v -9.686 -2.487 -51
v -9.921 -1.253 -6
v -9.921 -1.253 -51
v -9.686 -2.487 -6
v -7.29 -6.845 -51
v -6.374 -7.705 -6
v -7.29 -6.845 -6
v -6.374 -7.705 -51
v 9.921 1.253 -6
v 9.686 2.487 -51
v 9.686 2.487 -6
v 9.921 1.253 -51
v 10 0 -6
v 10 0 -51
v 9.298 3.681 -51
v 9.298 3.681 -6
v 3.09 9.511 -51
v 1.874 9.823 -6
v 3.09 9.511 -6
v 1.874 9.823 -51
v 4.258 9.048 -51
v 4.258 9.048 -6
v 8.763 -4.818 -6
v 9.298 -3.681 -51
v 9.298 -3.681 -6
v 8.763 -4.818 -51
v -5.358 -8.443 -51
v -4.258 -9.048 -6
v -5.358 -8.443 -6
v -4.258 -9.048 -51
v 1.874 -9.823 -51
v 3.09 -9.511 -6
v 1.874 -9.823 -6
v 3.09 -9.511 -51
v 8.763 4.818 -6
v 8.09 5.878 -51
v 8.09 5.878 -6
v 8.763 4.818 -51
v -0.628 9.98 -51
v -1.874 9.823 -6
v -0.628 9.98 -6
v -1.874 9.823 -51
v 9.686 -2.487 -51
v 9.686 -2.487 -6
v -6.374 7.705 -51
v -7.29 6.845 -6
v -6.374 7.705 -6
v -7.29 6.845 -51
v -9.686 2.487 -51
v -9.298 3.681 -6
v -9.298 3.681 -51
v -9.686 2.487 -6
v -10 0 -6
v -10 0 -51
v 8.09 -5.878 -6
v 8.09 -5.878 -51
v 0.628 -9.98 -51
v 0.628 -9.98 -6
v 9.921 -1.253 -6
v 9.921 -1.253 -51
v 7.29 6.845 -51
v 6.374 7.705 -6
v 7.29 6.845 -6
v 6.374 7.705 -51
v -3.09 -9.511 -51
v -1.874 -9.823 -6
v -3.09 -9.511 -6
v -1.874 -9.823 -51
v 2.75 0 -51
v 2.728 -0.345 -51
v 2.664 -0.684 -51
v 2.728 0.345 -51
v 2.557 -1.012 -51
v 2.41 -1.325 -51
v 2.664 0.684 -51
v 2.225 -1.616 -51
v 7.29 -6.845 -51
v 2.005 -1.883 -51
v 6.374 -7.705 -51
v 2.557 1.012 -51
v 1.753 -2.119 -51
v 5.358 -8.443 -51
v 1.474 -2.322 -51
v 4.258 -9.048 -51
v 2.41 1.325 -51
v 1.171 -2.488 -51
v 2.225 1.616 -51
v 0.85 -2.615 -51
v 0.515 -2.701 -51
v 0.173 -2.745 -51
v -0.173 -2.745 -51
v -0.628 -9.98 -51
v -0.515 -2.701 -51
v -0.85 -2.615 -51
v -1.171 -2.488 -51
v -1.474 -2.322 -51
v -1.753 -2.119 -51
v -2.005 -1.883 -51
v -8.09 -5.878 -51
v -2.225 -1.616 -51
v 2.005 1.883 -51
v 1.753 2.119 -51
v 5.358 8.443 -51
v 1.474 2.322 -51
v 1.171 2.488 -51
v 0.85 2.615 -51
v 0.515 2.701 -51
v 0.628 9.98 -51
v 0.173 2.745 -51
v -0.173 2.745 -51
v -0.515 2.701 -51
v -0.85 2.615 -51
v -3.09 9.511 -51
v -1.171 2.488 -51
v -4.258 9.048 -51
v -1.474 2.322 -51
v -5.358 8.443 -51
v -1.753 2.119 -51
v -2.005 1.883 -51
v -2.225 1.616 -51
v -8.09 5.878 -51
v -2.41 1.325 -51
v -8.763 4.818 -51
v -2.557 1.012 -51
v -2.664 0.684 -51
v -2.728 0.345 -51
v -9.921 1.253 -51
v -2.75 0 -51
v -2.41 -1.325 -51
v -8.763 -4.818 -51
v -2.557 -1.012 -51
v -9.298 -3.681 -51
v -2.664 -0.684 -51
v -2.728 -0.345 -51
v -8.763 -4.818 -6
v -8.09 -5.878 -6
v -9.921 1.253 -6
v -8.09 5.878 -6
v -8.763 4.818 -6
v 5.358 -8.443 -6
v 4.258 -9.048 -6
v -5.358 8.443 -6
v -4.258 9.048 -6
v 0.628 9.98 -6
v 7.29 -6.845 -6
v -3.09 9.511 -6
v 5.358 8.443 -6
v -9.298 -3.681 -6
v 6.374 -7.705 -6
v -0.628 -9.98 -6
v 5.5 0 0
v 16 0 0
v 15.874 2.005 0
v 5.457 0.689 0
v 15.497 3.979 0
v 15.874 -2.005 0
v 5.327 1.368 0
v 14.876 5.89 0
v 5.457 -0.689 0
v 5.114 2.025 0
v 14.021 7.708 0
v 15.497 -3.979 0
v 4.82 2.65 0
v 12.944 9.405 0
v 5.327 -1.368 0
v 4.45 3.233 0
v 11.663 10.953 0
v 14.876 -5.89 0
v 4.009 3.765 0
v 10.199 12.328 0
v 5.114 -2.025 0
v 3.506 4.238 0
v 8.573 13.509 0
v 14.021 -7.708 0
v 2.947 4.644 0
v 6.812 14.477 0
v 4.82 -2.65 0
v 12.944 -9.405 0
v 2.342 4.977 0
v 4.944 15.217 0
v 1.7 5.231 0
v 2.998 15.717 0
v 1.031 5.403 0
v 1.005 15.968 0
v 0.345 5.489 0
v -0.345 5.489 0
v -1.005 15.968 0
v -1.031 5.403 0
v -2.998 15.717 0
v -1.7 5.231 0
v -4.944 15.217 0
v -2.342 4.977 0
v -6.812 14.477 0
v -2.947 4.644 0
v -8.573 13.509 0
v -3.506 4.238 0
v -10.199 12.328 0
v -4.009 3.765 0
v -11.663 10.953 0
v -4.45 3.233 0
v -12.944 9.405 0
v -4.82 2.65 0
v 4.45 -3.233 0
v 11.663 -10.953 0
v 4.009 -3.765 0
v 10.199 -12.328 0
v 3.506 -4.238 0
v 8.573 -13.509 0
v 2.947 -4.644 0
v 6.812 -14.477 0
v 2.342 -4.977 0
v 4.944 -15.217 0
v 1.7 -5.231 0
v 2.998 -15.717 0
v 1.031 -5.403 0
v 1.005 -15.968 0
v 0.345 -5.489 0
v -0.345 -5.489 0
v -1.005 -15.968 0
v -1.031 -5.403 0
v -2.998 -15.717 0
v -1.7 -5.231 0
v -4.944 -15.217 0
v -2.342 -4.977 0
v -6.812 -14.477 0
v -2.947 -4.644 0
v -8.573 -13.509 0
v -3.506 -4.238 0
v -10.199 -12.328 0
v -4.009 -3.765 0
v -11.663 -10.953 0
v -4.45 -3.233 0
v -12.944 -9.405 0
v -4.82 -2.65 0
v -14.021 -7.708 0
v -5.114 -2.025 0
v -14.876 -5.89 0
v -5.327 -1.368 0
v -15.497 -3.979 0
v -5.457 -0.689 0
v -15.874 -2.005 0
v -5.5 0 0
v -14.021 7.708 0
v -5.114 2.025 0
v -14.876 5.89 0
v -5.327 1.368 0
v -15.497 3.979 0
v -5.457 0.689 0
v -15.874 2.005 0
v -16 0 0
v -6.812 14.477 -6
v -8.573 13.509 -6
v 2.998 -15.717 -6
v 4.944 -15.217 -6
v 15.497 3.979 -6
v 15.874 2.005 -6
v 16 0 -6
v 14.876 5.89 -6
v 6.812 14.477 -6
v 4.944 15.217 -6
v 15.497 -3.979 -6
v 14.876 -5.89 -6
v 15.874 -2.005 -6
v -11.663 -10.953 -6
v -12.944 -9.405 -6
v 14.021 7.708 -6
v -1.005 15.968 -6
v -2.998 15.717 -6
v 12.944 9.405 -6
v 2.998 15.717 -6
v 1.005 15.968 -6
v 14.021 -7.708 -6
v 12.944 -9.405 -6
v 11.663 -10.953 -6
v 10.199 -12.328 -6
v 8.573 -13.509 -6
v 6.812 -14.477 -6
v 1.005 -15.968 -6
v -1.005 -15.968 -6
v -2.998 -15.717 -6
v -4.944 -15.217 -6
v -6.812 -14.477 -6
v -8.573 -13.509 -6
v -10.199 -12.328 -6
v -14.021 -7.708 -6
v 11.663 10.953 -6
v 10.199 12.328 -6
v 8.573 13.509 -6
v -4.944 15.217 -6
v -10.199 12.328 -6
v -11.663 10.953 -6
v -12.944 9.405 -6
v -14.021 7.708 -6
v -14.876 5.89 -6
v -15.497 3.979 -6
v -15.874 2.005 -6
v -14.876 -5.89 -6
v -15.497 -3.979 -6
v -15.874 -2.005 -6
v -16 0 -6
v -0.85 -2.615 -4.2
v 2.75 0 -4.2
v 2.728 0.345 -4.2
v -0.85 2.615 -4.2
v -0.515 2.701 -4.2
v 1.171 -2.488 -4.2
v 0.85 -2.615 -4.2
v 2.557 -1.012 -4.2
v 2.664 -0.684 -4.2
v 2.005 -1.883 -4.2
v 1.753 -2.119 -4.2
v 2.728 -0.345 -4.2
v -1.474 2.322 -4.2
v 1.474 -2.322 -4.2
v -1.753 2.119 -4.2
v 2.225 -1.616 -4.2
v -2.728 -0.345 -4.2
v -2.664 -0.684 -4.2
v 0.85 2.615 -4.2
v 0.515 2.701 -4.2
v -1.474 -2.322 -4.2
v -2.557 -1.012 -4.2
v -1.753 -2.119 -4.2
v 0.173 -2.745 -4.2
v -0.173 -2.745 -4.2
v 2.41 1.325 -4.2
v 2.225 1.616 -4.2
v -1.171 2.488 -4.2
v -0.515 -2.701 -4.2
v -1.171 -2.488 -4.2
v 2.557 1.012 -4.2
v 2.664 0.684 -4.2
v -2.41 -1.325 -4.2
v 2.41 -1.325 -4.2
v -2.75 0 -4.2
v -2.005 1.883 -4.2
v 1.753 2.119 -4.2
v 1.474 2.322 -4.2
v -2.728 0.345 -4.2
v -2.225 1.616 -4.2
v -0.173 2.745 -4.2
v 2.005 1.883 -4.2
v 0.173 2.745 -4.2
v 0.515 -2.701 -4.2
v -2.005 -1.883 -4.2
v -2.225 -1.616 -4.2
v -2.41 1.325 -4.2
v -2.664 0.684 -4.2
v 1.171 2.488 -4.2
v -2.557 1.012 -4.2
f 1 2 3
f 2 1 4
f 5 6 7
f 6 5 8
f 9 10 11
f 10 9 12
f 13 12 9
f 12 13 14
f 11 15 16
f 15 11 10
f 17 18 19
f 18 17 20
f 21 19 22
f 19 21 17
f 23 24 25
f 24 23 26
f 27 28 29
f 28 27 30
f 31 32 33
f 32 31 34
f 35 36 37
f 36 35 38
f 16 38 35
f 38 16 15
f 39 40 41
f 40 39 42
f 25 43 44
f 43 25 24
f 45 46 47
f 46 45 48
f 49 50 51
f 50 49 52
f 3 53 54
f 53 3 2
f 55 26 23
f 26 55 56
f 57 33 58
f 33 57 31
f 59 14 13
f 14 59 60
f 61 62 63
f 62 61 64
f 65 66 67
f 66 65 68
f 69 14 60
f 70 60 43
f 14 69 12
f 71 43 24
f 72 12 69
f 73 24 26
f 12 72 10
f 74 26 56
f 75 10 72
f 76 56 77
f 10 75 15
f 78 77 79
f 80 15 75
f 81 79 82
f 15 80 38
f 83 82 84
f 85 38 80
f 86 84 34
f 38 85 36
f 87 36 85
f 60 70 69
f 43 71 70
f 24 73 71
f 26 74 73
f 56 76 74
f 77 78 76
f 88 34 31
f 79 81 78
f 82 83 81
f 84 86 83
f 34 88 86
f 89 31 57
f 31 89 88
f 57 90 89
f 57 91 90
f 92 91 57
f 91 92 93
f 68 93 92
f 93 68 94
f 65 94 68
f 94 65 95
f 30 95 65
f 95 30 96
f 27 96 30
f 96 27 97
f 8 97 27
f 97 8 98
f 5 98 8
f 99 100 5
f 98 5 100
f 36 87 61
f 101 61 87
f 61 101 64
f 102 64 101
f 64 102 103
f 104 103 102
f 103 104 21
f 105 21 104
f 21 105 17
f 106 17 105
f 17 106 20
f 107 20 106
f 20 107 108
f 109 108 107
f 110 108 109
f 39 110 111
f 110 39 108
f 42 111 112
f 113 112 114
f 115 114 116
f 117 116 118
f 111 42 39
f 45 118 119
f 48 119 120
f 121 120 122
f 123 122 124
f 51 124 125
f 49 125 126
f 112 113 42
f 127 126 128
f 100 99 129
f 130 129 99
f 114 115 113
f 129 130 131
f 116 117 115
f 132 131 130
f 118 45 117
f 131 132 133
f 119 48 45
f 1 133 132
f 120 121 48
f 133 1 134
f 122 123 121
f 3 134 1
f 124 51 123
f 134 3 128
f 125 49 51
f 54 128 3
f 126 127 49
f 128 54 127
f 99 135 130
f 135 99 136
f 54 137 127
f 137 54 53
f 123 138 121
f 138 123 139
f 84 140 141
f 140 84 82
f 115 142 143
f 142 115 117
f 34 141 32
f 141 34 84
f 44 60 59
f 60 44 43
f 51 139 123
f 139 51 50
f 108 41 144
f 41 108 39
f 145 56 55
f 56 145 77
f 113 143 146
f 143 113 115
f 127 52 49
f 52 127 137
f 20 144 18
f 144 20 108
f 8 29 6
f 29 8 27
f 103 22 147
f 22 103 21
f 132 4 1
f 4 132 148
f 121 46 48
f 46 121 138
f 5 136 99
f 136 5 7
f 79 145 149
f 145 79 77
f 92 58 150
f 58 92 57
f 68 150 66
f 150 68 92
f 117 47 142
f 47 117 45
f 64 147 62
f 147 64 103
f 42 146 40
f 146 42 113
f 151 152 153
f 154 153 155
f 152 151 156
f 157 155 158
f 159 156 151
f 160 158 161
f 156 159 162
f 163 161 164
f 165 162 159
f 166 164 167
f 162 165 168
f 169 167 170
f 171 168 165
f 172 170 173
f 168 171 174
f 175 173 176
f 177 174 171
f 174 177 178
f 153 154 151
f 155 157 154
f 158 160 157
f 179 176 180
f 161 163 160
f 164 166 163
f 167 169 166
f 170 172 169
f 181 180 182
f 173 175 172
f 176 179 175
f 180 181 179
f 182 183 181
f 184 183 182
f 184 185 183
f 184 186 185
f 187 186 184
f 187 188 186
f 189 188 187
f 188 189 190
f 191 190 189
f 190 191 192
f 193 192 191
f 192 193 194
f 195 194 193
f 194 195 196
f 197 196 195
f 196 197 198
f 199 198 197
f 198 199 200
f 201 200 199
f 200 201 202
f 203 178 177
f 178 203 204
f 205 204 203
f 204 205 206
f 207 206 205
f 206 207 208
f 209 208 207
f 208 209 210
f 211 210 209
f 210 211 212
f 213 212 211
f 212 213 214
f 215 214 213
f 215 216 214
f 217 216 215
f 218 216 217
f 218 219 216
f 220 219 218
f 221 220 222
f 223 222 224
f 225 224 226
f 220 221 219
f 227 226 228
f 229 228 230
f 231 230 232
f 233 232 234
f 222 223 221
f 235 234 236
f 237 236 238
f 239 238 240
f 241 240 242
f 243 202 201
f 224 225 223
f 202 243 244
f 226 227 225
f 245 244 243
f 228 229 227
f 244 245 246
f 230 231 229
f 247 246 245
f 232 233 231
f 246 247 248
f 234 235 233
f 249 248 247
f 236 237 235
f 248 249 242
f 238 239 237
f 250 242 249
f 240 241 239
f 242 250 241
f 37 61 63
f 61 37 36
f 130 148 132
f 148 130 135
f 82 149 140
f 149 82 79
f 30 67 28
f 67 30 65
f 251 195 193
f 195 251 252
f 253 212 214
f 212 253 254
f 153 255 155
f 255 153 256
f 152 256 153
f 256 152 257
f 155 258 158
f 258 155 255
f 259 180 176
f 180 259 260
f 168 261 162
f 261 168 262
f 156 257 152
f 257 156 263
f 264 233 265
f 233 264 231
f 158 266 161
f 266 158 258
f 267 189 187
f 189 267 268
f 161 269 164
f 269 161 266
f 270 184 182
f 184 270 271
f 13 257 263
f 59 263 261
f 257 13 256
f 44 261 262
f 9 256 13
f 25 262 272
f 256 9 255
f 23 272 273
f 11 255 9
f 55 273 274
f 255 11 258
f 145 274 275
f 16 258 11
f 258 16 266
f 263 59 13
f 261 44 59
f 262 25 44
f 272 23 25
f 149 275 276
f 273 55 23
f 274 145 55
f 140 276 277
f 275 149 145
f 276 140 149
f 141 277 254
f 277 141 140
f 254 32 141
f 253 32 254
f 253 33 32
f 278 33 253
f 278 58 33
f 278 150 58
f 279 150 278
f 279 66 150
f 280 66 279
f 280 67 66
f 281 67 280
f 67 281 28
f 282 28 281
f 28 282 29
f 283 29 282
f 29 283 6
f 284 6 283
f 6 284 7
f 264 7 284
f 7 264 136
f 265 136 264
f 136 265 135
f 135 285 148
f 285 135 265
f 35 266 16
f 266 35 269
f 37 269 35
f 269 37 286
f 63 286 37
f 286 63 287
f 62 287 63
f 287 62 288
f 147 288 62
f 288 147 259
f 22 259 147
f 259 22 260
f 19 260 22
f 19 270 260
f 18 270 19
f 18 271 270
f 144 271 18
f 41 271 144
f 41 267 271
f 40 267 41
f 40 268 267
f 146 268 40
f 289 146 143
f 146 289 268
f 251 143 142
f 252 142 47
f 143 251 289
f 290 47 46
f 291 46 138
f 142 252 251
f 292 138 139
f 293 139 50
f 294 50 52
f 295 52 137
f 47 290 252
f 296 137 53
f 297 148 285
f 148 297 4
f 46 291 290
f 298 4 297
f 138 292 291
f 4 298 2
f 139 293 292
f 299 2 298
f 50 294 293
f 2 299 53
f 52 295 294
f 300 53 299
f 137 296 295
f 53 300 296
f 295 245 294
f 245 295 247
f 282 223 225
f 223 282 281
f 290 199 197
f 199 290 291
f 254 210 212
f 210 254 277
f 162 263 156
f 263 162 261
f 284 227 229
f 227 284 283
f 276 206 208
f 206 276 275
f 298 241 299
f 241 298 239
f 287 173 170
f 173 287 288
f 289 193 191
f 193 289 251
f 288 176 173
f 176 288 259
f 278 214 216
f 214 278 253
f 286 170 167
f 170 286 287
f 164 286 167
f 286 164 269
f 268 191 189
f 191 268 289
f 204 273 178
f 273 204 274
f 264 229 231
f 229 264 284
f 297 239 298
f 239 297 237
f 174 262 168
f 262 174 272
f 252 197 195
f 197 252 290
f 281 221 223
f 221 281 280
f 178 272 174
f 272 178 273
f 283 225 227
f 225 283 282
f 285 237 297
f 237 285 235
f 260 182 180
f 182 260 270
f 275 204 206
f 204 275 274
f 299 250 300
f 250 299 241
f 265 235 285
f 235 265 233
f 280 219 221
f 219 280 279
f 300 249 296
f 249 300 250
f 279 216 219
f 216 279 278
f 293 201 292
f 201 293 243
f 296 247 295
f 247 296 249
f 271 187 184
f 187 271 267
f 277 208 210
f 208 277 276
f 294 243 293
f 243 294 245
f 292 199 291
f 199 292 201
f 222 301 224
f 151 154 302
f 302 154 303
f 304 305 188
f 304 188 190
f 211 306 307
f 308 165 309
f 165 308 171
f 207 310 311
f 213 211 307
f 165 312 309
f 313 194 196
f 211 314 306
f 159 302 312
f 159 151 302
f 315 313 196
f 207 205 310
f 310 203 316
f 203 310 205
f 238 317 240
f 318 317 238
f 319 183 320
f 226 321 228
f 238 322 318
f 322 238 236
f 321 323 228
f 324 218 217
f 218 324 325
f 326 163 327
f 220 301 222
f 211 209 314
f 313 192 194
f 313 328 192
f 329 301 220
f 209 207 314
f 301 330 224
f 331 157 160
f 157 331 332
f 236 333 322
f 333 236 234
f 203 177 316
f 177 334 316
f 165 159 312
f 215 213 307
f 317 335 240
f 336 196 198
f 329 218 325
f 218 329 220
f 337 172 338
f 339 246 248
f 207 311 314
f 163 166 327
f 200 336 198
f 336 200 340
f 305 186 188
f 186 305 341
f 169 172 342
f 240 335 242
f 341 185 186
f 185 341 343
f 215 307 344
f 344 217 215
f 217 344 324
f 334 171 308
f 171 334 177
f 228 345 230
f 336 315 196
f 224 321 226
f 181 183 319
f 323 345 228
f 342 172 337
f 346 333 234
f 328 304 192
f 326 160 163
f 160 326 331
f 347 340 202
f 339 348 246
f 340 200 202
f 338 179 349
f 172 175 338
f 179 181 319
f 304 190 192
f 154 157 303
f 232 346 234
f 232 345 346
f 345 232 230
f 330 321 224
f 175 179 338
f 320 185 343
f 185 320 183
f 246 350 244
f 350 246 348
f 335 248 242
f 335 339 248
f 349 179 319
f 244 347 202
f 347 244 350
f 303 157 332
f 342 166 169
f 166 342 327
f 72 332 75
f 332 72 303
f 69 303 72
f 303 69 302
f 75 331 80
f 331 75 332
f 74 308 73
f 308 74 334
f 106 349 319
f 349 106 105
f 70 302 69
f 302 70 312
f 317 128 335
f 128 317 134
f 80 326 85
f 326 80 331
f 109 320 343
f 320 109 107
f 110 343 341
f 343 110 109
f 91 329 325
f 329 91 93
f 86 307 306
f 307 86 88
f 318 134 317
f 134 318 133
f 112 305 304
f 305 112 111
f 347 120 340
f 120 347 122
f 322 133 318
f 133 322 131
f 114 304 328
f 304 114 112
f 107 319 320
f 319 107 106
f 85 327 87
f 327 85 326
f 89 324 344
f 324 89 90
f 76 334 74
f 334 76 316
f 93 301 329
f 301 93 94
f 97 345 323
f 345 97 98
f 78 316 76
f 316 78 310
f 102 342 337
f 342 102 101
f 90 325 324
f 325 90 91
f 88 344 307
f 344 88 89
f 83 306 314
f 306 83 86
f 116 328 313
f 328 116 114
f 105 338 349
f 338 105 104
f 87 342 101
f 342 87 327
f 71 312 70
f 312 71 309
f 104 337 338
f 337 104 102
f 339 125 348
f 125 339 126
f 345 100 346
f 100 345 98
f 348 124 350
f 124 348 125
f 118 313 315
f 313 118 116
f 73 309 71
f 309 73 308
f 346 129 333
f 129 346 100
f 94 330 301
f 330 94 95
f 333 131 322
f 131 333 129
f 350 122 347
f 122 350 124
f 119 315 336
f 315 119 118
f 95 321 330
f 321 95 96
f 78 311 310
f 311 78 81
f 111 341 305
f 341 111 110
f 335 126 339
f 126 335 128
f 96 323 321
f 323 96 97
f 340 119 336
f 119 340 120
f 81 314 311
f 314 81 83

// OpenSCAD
$fn = 50;


difference() {
	union() {
		translate(v = [0, 0, -51.0000000000]) {
			cylinder(h = 51, r = 10.0000000000);
		}
		translate(v = [0, 0, -6.0000000000]) {
			cylinder(h = 6, r = 16.0000000000);
		}
	}
	union() {
		translate(v = [0, 0, 0]) {
			rotate(a = [0, 0, 0]) {
				difference() {
					union() {
						#translate(v = [0, 0, -51.0000000000]) {
							cylinder(h = 51, r = 2.2500000000);
						}
						#translate(v = [0, 0, -4.2000000000]) {
							cylinder(h = 4.2000000000, r = 10.0000000000, r1 = 2.7500000000, r2 = 5.5000000000);
						}
						#translate(v = [0, 0, -51.0000000000]) {
							cylinder(h = 51, r = 2.7500000000);
						}
						#translate(v = [0, 0, -51.0000000000]) {
							cylinder(h = 51, r = 2.2500000000);
						}
					}
					union();
				}
			}
		}
	}
}
